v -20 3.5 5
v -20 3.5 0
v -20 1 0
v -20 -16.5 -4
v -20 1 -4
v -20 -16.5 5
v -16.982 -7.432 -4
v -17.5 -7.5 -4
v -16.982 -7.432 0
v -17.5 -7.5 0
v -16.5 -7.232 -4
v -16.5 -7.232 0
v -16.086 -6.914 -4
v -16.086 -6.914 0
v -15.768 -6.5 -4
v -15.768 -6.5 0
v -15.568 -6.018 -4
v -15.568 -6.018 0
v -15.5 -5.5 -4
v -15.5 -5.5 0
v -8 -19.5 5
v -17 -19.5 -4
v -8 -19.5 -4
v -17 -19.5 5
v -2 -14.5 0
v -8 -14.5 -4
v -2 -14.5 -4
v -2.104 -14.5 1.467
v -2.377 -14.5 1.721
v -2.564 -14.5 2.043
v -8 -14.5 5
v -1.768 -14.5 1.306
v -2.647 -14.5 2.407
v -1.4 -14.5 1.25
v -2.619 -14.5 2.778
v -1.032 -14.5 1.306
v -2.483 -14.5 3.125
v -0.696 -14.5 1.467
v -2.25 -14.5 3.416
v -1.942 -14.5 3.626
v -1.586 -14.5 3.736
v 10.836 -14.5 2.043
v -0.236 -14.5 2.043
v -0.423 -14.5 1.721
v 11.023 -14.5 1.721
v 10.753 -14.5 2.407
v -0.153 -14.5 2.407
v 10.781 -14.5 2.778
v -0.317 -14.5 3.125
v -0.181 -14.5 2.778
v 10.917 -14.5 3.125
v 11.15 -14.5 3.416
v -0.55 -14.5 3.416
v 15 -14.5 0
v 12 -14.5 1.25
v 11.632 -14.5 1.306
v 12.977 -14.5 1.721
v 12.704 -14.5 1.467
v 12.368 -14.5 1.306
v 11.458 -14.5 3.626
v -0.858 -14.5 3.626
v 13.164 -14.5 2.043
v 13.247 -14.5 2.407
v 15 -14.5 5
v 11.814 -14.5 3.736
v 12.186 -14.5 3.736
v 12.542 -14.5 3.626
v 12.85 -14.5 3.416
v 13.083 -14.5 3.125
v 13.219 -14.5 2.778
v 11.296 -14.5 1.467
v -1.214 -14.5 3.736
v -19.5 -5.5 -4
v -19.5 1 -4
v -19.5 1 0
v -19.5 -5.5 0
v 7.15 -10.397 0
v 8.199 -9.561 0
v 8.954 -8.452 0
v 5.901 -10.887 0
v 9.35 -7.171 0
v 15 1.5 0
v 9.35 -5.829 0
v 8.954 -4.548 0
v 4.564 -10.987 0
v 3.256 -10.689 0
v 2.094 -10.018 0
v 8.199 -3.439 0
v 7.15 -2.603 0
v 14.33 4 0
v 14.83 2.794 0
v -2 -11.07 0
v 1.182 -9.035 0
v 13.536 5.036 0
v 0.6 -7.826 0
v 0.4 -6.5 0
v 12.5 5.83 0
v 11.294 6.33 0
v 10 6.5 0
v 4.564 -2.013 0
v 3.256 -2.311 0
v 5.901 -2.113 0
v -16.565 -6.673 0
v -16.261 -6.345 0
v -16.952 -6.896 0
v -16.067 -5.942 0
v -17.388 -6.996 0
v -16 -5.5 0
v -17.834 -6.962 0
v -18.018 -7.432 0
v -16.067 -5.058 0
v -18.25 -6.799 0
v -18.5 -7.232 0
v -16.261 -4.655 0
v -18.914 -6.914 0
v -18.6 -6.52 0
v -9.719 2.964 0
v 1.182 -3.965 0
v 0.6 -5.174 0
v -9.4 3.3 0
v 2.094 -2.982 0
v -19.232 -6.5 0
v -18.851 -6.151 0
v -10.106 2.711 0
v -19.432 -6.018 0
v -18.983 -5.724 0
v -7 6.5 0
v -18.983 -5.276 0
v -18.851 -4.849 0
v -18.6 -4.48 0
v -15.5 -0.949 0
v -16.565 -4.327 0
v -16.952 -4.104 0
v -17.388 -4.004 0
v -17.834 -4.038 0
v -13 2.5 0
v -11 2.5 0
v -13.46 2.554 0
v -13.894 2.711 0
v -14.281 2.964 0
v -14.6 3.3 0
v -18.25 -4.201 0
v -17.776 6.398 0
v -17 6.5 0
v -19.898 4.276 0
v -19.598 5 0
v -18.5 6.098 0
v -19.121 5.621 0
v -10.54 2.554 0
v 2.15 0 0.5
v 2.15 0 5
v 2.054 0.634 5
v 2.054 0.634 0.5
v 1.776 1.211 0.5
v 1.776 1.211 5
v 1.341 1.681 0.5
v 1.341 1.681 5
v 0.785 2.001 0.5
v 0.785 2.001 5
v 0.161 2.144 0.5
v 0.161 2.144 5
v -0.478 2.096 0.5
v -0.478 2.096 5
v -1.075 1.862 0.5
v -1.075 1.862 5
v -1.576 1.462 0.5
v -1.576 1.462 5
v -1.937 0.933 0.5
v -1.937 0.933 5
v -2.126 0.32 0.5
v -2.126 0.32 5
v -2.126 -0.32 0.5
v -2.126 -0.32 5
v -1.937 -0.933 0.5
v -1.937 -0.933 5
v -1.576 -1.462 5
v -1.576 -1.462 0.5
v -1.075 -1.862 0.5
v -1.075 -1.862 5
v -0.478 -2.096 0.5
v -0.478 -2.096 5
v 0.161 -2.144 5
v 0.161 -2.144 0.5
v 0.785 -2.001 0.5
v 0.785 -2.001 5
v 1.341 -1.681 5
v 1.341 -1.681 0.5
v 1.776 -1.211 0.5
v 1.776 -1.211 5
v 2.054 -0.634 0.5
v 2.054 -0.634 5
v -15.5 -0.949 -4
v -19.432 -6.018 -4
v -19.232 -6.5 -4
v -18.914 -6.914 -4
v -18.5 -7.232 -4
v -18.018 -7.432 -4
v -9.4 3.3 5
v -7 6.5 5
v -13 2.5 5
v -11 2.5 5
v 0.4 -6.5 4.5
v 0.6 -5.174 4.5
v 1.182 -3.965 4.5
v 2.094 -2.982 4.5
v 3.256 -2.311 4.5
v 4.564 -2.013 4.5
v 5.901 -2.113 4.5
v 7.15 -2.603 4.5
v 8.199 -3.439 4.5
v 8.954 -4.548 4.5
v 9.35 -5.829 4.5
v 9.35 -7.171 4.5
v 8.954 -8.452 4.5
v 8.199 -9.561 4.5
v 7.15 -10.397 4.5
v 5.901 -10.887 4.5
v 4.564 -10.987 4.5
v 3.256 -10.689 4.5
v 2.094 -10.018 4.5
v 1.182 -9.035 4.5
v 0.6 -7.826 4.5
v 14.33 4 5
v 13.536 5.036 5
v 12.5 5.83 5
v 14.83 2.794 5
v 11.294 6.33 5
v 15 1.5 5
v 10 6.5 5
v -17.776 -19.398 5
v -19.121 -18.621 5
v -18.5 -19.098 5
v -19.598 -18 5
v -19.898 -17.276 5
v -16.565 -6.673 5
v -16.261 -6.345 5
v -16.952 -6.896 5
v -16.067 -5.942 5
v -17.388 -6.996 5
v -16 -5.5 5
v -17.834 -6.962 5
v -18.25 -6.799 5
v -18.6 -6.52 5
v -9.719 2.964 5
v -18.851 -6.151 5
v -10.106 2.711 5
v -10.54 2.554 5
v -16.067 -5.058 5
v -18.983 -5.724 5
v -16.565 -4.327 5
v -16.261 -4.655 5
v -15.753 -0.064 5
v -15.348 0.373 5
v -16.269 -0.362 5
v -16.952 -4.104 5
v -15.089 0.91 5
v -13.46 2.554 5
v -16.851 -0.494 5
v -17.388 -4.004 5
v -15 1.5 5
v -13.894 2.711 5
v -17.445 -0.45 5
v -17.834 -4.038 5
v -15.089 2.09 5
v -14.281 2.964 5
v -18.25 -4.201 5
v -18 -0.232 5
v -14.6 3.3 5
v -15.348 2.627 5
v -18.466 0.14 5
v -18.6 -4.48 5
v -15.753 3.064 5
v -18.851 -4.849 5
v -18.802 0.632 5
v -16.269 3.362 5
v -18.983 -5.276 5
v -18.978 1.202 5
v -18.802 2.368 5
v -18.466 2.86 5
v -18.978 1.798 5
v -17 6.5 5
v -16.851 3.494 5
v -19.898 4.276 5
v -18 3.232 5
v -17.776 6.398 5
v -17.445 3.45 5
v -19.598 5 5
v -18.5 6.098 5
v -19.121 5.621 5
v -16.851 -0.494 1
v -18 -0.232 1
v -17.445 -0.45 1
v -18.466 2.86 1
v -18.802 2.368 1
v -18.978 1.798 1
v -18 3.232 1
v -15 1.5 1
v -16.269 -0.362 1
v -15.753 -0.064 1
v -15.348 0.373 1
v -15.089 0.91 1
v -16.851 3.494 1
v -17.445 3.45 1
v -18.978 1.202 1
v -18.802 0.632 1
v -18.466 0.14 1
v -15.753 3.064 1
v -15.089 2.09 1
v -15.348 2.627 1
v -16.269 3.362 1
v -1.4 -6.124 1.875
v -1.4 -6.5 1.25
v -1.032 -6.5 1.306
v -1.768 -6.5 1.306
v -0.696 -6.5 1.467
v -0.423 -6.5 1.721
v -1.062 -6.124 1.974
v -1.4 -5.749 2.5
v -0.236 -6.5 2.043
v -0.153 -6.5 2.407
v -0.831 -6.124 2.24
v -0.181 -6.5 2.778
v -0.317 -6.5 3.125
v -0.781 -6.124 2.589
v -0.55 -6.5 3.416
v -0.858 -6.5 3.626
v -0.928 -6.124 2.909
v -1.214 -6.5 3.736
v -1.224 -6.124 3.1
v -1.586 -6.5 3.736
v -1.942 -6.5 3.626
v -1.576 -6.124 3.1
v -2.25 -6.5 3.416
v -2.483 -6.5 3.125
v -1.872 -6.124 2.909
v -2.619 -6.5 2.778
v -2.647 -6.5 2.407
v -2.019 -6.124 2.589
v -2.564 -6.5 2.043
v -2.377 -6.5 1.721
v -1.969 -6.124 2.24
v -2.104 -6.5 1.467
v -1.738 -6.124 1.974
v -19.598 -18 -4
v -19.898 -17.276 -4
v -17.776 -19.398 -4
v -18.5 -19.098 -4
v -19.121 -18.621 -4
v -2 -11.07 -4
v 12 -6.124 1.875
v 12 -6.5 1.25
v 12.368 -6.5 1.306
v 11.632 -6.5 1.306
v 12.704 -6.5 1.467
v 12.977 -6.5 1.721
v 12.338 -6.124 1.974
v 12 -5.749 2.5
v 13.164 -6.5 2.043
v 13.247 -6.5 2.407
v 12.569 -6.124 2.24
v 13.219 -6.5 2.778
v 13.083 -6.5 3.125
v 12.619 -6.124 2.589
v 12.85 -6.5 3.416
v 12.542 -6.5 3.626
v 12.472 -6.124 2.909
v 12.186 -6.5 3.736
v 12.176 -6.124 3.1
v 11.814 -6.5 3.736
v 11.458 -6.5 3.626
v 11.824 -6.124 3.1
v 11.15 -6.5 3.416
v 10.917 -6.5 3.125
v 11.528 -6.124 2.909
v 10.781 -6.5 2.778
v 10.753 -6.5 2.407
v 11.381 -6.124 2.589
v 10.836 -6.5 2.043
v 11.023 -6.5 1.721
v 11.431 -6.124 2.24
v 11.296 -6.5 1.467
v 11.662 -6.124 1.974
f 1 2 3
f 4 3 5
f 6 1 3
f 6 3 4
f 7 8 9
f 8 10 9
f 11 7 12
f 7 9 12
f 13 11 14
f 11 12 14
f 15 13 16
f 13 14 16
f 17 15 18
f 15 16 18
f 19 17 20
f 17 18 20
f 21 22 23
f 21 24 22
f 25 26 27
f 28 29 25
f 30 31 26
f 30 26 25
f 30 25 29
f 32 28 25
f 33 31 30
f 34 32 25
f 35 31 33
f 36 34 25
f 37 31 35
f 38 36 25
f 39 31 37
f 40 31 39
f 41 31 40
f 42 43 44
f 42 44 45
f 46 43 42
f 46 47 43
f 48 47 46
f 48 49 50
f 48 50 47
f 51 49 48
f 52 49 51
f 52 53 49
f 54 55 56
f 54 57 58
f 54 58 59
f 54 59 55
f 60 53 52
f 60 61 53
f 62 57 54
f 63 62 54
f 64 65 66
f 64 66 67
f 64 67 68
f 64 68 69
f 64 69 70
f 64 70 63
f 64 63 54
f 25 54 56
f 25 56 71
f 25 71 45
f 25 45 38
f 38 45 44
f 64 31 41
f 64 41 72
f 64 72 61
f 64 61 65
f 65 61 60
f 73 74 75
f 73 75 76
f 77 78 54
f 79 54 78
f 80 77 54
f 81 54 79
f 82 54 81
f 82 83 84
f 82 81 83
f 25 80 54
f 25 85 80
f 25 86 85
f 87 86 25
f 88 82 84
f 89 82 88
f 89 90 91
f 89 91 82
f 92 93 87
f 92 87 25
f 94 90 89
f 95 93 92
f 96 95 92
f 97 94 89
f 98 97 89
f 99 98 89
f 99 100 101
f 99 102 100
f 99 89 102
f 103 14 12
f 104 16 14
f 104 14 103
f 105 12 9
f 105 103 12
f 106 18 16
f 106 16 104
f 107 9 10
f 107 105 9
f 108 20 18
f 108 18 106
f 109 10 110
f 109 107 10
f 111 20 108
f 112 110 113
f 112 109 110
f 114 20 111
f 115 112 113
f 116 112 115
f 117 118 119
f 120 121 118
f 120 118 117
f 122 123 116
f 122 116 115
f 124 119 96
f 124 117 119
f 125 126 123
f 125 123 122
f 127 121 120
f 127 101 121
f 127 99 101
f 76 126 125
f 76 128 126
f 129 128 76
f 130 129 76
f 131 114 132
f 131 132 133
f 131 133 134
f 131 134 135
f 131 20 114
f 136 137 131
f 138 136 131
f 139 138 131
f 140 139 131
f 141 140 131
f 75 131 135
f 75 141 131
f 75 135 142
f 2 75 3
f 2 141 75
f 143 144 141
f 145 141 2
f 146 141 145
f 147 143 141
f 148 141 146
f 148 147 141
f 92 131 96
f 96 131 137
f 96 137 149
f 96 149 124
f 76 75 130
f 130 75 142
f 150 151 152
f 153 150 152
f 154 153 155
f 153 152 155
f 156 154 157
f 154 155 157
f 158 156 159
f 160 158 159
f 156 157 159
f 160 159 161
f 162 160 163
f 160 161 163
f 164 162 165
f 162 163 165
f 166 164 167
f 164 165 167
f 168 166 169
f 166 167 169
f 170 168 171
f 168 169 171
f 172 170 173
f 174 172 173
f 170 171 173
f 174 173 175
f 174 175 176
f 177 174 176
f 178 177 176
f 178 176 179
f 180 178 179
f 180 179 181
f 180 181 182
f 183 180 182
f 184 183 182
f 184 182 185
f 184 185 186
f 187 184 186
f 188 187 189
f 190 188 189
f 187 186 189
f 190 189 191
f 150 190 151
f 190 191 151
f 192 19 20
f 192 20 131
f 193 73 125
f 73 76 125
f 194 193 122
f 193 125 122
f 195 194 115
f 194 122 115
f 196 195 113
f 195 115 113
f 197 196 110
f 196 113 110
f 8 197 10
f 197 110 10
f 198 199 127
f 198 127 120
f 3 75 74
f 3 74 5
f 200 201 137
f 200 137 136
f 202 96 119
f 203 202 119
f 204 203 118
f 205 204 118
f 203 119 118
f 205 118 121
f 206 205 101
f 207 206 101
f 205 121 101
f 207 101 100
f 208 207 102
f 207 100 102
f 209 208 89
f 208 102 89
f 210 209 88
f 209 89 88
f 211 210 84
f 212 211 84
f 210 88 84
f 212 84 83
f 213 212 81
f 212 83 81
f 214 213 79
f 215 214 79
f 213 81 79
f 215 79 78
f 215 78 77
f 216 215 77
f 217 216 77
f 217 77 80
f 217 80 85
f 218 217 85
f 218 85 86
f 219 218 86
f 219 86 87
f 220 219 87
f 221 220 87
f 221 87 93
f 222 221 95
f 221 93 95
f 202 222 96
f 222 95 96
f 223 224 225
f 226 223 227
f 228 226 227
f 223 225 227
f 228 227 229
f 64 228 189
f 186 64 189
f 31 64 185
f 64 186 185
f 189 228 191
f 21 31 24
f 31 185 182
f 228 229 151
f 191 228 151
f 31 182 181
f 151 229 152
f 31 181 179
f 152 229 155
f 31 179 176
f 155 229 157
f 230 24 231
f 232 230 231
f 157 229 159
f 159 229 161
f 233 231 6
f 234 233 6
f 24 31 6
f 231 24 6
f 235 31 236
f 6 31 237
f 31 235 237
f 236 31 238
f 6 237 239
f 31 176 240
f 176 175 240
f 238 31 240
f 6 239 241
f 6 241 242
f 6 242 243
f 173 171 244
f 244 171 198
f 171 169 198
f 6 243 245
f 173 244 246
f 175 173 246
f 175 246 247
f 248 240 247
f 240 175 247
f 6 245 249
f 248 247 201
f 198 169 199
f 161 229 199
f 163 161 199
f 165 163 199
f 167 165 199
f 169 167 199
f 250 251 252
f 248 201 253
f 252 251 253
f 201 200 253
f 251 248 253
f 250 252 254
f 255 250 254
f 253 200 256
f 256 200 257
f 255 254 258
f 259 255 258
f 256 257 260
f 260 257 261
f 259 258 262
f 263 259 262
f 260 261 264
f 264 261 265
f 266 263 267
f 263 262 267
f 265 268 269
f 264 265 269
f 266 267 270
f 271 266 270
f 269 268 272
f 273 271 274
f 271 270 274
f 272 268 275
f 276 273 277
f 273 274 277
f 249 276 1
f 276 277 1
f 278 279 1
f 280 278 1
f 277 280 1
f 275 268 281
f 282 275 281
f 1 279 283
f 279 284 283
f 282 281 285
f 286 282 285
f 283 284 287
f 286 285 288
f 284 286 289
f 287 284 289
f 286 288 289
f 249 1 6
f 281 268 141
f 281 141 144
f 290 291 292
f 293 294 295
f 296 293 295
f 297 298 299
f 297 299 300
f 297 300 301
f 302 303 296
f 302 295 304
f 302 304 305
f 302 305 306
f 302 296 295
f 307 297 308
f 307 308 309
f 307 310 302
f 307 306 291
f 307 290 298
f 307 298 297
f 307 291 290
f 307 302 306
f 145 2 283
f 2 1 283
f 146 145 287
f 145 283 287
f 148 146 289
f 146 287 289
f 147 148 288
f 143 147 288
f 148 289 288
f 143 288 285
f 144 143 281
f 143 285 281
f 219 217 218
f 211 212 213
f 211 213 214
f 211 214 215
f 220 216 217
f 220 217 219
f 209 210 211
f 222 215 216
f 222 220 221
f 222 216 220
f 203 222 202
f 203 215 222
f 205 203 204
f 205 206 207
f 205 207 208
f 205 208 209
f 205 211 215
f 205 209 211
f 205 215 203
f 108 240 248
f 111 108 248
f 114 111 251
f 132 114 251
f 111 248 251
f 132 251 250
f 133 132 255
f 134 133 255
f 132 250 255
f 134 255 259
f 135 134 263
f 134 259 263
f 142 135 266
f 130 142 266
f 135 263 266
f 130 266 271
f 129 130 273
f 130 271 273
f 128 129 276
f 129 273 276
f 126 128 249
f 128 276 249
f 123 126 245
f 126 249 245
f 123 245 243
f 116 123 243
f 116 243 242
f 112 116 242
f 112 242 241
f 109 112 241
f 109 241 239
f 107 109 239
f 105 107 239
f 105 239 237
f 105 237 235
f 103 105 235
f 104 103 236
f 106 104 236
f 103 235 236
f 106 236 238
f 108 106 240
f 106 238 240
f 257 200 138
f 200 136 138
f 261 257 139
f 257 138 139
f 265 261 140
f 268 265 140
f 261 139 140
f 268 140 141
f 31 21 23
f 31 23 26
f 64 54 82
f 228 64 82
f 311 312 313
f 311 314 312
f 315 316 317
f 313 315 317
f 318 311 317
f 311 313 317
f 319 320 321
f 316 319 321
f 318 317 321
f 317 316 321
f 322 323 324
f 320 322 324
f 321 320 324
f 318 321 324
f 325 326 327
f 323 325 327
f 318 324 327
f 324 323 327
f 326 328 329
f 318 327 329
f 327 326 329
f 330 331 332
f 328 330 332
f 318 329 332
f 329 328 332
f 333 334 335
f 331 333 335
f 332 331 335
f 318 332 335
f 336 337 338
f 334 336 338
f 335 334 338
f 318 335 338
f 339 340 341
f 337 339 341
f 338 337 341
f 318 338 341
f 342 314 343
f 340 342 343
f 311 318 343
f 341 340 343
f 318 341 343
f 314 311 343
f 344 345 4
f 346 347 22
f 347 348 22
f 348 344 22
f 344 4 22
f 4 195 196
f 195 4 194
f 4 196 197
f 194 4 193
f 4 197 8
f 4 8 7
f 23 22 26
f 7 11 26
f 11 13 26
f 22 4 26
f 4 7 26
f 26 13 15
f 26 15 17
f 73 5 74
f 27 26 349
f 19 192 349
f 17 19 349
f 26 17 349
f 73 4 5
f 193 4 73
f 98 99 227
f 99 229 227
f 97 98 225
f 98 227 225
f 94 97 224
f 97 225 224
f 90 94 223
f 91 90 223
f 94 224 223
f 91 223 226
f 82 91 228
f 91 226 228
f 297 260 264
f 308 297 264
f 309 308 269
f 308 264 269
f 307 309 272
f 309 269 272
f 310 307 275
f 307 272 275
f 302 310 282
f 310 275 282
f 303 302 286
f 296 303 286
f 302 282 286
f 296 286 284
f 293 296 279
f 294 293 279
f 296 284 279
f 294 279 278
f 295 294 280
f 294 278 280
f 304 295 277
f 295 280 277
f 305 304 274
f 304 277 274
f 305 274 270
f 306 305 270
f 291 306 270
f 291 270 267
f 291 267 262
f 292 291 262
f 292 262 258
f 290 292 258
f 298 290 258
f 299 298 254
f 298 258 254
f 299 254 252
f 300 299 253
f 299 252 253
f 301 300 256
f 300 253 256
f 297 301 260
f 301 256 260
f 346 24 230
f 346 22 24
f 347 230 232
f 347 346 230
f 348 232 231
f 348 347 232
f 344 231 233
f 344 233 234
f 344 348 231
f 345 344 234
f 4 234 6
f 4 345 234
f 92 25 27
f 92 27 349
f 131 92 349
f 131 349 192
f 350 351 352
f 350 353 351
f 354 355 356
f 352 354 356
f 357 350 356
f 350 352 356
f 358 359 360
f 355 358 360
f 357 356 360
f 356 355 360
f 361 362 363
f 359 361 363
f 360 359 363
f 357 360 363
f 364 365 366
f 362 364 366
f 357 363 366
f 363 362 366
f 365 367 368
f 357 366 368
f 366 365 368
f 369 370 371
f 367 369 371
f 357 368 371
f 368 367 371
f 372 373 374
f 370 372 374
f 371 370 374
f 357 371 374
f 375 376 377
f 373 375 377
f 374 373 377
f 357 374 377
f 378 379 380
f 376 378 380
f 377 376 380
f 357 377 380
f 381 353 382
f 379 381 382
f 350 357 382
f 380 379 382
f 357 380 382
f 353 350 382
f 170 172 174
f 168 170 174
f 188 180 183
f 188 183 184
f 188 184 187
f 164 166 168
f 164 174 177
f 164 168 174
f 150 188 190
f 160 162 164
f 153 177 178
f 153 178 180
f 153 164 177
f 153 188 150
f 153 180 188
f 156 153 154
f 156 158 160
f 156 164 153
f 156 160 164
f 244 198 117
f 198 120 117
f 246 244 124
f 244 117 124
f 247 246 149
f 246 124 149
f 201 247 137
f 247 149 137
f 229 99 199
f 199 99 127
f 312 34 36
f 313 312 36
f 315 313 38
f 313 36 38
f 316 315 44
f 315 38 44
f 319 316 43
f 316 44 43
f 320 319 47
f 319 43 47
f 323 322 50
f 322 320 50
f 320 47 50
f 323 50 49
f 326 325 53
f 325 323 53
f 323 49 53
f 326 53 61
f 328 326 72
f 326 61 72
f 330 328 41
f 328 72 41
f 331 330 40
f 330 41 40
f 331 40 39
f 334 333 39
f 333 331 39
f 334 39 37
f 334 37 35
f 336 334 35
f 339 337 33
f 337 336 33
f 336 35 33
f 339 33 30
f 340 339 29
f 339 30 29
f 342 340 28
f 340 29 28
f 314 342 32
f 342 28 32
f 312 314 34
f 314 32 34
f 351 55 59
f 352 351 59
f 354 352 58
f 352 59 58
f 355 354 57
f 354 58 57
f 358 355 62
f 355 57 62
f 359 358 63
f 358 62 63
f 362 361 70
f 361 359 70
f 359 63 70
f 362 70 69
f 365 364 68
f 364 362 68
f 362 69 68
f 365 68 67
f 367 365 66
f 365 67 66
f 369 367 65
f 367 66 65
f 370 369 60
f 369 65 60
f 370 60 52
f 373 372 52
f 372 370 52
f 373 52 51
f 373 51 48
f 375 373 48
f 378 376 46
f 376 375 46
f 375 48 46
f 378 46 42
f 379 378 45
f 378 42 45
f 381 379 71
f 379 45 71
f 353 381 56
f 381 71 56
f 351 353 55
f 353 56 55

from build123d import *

# Parameters (mm, degrees)
SKETCH1_W             = 23
SKETCH1_H             = 21
EXTRUDE1_DEPTH        = 5
SKETCH2_R             = 2.15
EXTRUDE2_DEPTH        = 4.5
SKETCH4_R             = 1.25
EXTRUDE4_DEPTH        = 8
FILLET1_R             = 5
SKETCH6_R             = 4.5
EXTRUDE6_DEPTH        = 4.5
SKETCH9_W             = 12
SKETCH9_H             = 26
EXTRUDE9_DEPTH        = 5
SKETCH10_R            = 2
EXTRUDE10_DEPTH       = 4
SKETCH11_R            = 1.5
EXTRUDE11_DEPTH       = 5
M3_TAPPED_HOLE1_D     = 2.5
M3_TAPPED_HOLE1_DEPTH = 8
M3_TAPPED_HOLE1_TIP   = 0.751075774
EXTRUDE12_DEPTH       = 4
FILLET3_R             = 3
EXTRUDE14_DEPTH       = 4
FILLET4_R             = 2
EXTRUDE15_DEPTH       = 5
FILLET6_R             = 2


with BuildPart() as part:
    # Sketch1 → Extrude1 (new body)
    with BuildSketch(Plane.XY):
        with Locations((3.5, -4)):
            Rectangle(SKETCH1_W, SKETCH1_H)
    extrude(amount=EXTRUDE1_DEPTH)

    # Sketch2 → Extrude2 (cut)
    with BuildSketch(Plane.XY.offset(5)):
        Circle(SKETCH2_R)
    extrude(amount=-EXTRUDE2_DEPTH, mode=Mode.SUBTRACT)

    # Sketch4 → Extrude4 (cut)
    with BuildSketch(Plane.XZ.offset(14.5)):
        with Locations(Location((-1.4, 2.5, 0), (0, 0, 270))):
            Circle(SKETCH4_R)
        with Locations(Location((12, 2.5, 0), (0, 0, 270))):
            Circle(SKETCH4_R)
    extrude(amount=-EXTRUDE4_DEPTH, mode=Mode.SUBTRACT)

    # Fillet1
    fillet1_edges = [part.edges().sort_by_distance(p)[0] for p in [
        (15, 6.5, 2.5),
    ]]
    fillet(fillet1_edges, radius=FILLET1_R)

    # Sketch6 → Extrude6 (cut)
    with BuildSketch(Plane(origin=(0, 0, 0), x_dir=(-1, 0, 0), z_dir=(0, 0, -1))):
        with Locations((-4.9, -6.5)):
            Circle(SKETCH6_R)
    extrude(amount=-EXTRUDE6_DEPTH, mode=Mode.SUBTRACT)

    # Sketch9 → Extrude9 (add)
    with BuildSketch(Plane(origin=(0, 0, 0), x_dir=(-1, 0, 0), z_dir=(0, 0, -1))):
        with Locations((14, -6.5)):
            Rectangle(SKETCH9_W, SKETCH9_H)
    extrude(amount=-EXTRUDE9_DEPTH)

    # Sketch10 → Extrude10 (cut)
    with BuildSketch(Plane.XY.offset(5)):
        with Locations((-17, 1.5)):
            Circle(SKETCH10_R)
    extrude(amount=-EXTRUDE10_DEPTH, mode=Mode.SUBTRACT)

    # Sketch11 → Extrude11 (cut)
    with BuildSketch(Plane.XY.offset(5)):
        with Locations((-17.5, -5.5)):
            Circle(SKETCH11_R)
    extrude(amount=-EXTRUDE11_DEPTH, mode=Mode.SUBTRACT)

    # M3 Tapped Hole1
    with Locations(Plane(origin=(-1.4, -14.5, 2.5), x_dir=(0, 0, -1), z_dir=(0, -1, 0))):
        with Locations((0, 0), (0, 13.4)):
            Hole(M3_TAPPED_HOLE1_D / 2, depth=M3_TAPPED_HOLE1_DEPTH)
            with Locations((0, 0, -(M3_TAPPED_HOLE1_DEPTH + M3_TAPPED_HOLE1_TIP / 2))):  # 118° drill point
                Cone(0, M3_TAPPED_HOLE1_D / 2, M3_TAPPED_HOLE1_TIP, mode=Mode.SUBTRACT)

    # Sketch13 → Extrude12 (add)
    with BuildSketch(Plane(origin=(0, 0, 0), x_dir=(-1, 0, 0), z_dir=(0, 0, -1))):
        Polygon((20, -19.5), (8, -19.5), (8, -14.5), (2, -14.5), (2, -11.07), (18.1, 1), (20, 1), align=None)
    extrude(amount=EXTRUDE12_DEPTH)

    # Fillet3
    fillet3_edges = [part.edges().sort_by_distance(p)[0] for p in [
        (-20, -19.5, 0.5),
        (-20, 6.5, 2.5),
    ]]
    fillet(fillet3_edges, radius=FILLET3_R)

    # Sketch14 → Extrude14 (cut)
    with BuildSketch(Plane(origin=(0, 0, -4), x_dir=(-1, 0, 0), z_dir=(0, 0, -1))):
        Polygon((19.5, 1), (19.5, -7.5), (15.5, -7.5), (15.5, -0.949192547), (18.1, 1), align=None)
    extrude(amount=-EXTRUDE14_DEPTH, mode=Mode.SUBTRACT)

    # Fillet4
    fillet4_edges = [part.edges().sort_by_distance(p)[0] for p in [
        (-19.5, -7.5, -2),
        (-15.5, -7.5, -2),
    ]]
    fillet(fillet4_edges, radius=FILLET4_R - 0.0001)  # a hair under: the kernel refuses the full size

    # Sketch15 → Extrude15 (cut)
    with BuildSketch(Plane.XY.offset(5)):
        Polygon((-14, 2.5), (-17, 6.5), (-7, 6.5), (-10, 2.5), align=None)
    extrude(amount=-EXTRUDE15_DEPTH, mode=Mode.SUBTRACT)

    # Fillet6
    fillet6_edges = [part.edges().sort_by_distance(p)[0] for p in [
        (-10, 2.5, 2.5),
        (-14, 2.5, 2.5),
    ]]
    fillet(fillet6_edges, radius=FILLET6_R)


solid = part.part
